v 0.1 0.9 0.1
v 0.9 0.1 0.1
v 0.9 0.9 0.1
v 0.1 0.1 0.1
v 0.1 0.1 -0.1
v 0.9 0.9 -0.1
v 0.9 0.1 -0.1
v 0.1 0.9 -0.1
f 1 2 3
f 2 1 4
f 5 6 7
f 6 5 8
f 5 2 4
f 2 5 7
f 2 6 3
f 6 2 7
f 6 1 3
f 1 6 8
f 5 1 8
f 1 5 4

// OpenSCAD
translate([.1, .1, -.1])
color([0.5, 0.5, 0.5])
cube([.8, .8, .2], center = false);
